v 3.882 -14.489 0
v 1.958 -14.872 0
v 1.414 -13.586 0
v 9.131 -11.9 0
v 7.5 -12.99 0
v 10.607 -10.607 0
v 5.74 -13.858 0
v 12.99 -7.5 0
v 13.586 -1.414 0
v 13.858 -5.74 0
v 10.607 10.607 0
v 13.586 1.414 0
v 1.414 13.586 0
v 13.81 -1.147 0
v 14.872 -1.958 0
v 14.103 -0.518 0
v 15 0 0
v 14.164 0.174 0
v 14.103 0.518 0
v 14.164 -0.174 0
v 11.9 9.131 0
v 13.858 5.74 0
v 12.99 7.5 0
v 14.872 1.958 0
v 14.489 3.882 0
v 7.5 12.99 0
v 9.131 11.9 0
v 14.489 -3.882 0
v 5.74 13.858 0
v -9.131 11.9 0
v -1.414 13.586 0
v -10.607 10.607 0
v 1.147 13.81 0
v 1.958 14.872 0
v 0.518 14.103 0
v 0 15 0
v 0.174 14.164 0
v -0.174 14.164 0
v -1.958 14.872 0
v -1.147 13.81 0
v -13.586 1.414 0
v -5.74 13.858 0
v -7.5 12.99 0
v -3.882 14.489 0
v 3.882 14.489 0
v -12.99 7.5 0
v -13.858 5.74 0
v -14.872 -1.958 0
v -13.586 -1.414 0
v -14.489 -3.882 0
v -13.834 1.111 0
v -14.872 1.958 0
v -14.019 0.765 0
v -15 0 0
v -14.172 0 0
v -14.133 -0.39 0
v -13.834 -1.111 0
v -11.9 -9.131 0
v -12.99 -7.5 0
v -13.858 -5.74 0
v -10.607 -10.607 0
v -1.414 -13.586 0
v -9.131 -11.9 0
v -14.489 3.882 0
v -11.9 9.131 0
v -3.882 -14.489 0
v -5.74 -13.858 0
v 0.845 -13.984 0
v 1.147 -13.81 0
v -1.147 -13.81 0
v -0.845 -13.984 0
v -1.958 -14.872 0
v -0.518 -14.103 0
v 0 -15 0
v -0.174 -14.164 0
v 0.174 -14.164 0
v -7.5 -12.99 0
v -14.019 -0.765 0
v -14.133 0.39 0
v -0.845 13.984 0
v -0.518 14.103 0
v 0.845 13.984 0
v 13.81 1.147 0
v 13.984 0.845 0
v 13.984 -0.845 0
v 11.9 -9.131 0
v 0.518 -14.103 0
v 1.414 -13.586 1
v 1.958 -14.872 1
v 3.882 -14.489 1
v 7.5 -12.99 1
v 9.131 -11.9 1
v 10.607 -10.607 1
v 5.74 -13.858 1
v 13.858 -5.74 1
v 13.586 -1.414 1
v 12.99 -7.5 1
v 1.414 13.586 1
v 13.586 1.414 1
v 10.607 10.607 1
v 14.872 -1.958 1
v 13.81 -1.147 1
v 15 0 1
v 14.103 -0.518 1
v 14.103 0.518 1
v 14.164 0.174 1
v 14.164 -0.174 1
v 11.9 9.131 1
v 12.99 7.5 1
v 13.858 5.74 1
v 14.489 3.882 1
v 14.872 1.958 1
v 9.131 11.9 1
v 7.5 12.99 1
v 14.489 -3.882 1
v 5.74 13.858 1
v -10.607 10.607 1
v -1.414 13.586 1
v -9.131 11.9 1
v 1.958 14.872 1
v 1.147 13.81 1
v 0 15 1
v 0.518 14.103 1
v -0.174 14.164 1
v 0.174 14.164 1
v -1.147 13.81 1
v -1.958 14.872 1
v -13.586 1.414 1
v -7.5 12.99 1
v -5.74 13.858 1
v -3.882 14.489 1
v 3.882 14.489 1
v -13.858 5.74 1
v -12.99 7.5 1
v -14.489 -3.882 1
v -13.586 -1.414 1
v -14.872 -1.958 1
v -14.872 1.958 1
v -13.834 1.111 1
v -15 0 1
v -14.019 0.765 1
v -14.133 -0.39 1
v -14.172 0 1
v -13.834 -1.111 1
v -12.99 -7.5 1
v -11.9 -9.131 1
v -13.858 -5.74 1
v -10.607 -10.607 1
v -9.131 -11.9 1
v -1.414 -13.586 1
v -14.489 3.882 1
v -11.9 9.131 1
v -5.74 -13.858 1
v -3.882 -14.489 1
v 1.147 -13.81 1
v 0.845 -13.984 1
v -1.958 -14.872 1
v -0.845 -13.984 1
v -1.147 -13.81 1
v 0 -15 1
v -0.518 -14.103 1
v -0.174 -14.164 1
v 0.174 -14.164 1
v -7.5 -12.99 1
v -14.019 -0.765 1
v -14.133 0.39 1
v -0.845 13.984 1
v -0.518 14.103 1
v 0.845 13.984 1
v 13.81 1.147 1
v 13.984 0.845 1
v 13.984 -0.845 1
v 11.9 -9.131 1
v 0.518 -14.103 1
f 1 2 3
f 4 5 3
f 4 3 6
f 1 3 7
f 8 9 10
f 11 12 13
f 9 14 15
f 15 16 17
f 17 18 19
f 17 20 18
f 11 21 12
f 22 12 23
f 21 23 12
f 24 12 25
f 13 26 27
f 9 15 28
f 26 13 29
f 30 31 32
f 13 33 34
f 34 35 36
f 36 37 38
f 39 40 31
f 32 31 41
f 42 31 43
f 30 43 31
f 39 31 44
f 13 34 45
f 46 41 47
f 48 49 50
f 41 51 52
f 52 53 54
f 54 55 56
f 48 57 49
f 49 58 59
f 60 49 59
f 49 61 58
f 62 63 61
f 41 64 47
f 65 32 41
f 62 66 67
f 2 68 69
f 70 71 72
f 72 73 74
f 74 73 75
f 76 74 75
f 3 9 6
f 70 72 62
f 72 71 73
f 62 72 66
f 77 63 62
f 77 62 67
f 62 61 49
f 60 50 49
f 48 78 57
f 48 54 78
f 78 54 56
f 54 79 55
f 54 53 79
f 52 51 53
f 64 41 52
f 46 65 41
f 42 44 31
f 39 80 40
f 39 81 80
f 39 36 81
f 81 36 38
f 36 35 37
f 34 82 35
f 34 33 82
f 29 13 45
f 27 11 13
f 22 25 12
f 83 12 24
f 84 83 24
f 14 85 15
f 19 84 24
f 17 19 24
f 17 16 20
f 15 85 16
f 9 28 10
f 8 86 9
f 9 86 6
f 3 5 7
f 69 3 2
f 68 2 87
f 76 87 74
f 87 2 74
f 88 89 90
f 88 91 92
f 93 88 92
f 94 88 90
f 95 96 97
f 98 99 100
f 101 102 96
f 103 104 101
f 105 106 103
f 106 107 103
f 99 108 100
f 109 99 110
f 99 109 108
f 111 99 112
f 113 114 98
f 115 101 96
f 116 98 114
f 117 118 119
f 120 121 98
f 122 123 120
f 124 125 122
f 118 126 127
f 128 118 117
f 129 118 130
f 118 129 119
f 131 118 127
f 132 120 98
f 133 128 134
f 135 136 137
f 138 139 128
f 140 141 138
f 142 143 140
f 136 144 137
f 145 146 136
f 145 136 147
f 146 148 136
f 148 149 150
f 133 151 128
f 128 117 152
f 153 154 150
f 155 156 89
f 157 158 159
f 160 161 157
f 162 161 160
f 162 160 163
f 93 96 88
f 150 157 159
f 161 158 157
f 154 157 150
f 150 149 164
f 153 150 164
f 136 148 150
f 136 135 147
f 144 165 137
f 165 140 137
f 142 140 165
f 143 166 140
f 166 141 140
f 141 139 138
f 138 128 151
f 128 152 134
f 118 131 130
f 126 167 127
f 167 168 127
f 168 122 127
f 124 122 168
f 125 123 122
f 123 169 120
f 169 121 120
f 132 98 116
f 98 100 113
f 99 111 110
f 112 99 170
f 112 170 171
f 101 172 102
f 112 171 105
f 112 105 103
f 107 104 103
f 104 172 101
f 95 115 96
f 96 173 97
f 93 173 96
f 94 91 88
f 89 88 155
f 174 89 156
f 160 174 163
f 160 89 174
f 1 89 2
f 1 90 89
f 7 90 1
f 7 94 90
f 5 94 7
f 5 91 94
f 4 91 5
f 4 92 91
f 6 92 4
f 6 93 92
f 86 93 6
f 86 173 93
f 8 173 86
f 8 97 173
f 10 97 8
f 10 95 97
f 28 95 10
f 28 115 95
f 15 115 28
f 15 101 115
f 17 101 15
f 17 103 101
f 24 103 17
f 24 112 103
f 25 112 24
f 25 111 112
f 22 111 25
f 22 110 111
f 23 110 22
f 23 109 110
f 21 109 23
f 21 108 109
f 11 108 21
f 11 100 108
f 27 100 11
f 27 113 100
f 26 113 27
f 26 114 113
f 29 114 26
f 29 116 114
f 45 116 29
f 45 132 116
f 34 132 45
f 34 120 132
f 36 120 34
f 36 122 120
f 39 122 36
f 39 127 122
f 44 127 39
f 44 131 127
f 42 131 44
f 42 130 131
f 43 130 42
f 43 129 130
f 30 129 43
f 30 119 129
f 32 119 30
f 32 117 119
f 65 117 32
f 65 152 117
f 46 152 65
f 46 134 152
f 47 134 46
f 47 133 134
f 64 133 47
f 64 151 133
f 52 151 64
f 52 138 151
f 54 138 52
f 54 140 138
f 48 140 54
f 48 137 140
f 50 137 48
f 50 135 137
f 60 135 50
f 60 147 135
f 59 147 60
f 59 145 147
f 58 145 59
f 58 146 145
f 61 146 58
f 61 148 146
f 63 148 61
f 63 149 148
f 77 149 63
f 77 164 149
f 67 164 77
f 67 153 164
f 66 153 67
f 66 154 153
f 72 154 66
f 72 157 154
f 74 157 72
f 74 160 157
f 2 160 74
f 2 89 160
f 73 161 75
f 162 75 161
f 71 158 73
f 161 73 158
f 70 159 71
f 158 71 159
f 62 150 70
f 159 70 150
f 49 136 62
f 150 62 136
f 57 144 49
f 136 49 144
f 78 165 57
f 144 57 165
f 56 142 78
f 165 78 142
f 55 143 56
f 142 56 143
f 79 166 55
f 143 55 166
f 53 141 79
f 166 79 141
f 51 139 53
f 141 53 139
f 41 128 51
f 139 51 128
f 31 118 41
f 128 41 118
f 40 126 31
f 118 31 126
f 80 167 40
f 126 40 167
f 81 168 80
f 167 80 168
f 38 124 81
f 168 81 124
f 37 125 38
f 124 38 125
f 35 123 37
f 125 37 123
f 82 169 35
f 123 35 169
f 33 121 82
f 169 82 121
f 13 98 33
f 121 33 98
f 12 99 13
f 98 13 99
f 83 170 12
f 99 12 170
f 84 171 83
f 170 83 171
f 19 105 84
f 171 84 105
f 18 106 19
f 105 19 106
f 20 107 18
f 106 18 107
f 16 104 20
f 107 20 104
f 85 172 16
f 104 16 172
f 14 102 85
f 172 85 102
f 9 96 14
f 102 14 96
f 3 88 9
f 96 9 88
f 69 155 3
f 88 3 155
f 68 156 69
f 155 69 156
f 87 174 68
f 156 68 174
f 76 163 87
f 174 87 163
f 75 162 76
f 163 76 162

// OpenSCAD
// Generated by Parametrix
ca_myPartQ_face1_000 = [ [ 15.0000, 0.0000 ],[ 14.8717, 1.9579 ],[ 14.4889, 3.8823 ],[ 13.8582, 5.7403 ],[ 12.9904, 7.5000 ],[ 11.9003, 9.1314 ],[ 10.6066, 10.6066 ],[ 9.1314, 11.9003 ],[ 7.5000, 12.9904 ],[ 5.7403, 13.8582 ],[ 3.8823, 14.4889 ],[ 1.9579, 14.8717 ],[ 0.0000, 15.0000 ],[ -1.9579, 14.8717 ],[ -3.8823, 14.4889 ],[ -5.7403, 13.8582 ],[ -7.5000, 12.9904 ],[ -9.1314, 11.9003 ],[ -10.6066, 10.6066 ],[ -11.9003, 9.1314 ],[ -12.9904, 7.5000 ],[ -13.8582, 5.7403 ],[ -14.4889, 3.8823 ],[ -14.8717, 1.9579 ],[ -15.0000, 0.0000 ],[ -14.8717, -1.9579 ],[ -14.4889, -3.8823 ],[ -13.8582, -5.7403 ],[ -12.9904, -7.5000 ],[ -11.9003, -9.1314 ],[ -10.6066, -10.6066 ],[ -9.1314, -11.9003 ],[ -7.5000, -12.9904 ],[ -5.7403, -13.8582 ],[ -3.8823, -14.4889 ],[ -1.9579, -14.8717 ],[ -0.0000, -15.0000 ],[ 1.9579, -14.8717 ],[ 3.8823, -14.4889 ],[ 5.7403, -13.8582 ],[ 7.5000, -12.9904 ],[ 9.1314, -11.9003 ],[ 10.6066, -10.6066 ],[ 11.9003, -9.1314 ],[ 12.9904, -7.5000 ],[ 13.8582, -5.7403 ],[ 14.4889, -3.8823 ],[ 14.8717, -1.9579 ],[ 15.0000, 0.0000 ] ];
cb_myPartQ_face1_000 = [  0, 1, 2, 3, 4, 5, 6, 7, 8, 9, 10, 11, 12, 13, 14, 15, 16, 17, 18, 19, 20, 21, 22, 23, 24, 25, 26, 27, 28, 29, 30, 31, 32, 33, 34, 35, 36, 37, 38, 39, 40, 41, 42, 43, 44, 45, 46, 47, 48 ];
ca_myPartQ_face1_001 = [ [ 13.5858, 1.4142 ],[ 1.4142, 13.5858 ],[ 1.1472, 13.8099 ],[ 0.8452, 13.9842 ],[ 0.5176, 14.1034 ],[ 0.1743, 14.1640 ],[ -0.1743, 14.1640 ],[ -0.5176, 14.1034 ],[ -0.8452, 13.9842 ],[ -1.1472, 13.8099 ],[ -1.4142, 13.5858 ],[ -13.5858, 1.4142 ],[ -13.8345, 1.1111 ],[ -14.0193, 0.7654 ],[ -14.1331, 0.3902 ],[ -14.1716, 0.0000 ],[ -14.1331, -0.3902 ],[ -14.0193, -0.7654 ],[ -13.8345, -1.1111 ],[ -13.5858, -1.4142 ],[ -1.4142, -13.5858 ],[ -1.1472, -13.8099 ],[ -0.8452, -13.9842 ],[ -0.5176, -14.1034 ],[ -0.1743, -14.1640 ],[ 0.1743, -14.1640 ],[ 0.5176, -14.1034 ],[ 0.8452, -13.9842 ],[ 1.1472, -13.8099 ],[ 1.4142, -13.5858 ],[ 13.5858, -1.4142 ],[ 13.8099, -1.1472 ],[ 13.9842, -0.8452 ],[ 14.1034, -0.5176 ],[ 14.1640, -0.1743 ],[ 14.1640, 0.1743 ],[ 14.1034, 0.5176 ],[ 13.9842, 0.8452 ],[ 13.8099, 1.1472 ],[ 13.5858, 1.4142 ] ];
cb_myPartQ_face1_001 = [  49, 50, 51, 52, 53, 54, 55, 56, 57, 58, 59, 60, 61, 62, 63, 64, 65, 66, 67, 68, 69, 70, 71, 72, 73, 74, 75, 76, 77, 78, 79, 80, 81, 82, 83, 84, 85, 86, 87, 88 ];
a_myPartQ_face1 = concat(ca_myPartQ_face1_000, ca_myPartQ_face1_001);
b_myPartQ_face1 = [cb_myPartQ_face1_000, cb_myPartQ_face1_001];

module subpax_myPartQ () {
	translate( [ 0, 0, 0 ])
		rotate( [ 0, 0, 0 ])
			   linear_extrude(height = 1) polygon(a_myPartQ_face1, b_myPartQ_face1);
}

module pax_myPartQ () {
	subpax_myPartQ();
}

pax_myPartQ();
